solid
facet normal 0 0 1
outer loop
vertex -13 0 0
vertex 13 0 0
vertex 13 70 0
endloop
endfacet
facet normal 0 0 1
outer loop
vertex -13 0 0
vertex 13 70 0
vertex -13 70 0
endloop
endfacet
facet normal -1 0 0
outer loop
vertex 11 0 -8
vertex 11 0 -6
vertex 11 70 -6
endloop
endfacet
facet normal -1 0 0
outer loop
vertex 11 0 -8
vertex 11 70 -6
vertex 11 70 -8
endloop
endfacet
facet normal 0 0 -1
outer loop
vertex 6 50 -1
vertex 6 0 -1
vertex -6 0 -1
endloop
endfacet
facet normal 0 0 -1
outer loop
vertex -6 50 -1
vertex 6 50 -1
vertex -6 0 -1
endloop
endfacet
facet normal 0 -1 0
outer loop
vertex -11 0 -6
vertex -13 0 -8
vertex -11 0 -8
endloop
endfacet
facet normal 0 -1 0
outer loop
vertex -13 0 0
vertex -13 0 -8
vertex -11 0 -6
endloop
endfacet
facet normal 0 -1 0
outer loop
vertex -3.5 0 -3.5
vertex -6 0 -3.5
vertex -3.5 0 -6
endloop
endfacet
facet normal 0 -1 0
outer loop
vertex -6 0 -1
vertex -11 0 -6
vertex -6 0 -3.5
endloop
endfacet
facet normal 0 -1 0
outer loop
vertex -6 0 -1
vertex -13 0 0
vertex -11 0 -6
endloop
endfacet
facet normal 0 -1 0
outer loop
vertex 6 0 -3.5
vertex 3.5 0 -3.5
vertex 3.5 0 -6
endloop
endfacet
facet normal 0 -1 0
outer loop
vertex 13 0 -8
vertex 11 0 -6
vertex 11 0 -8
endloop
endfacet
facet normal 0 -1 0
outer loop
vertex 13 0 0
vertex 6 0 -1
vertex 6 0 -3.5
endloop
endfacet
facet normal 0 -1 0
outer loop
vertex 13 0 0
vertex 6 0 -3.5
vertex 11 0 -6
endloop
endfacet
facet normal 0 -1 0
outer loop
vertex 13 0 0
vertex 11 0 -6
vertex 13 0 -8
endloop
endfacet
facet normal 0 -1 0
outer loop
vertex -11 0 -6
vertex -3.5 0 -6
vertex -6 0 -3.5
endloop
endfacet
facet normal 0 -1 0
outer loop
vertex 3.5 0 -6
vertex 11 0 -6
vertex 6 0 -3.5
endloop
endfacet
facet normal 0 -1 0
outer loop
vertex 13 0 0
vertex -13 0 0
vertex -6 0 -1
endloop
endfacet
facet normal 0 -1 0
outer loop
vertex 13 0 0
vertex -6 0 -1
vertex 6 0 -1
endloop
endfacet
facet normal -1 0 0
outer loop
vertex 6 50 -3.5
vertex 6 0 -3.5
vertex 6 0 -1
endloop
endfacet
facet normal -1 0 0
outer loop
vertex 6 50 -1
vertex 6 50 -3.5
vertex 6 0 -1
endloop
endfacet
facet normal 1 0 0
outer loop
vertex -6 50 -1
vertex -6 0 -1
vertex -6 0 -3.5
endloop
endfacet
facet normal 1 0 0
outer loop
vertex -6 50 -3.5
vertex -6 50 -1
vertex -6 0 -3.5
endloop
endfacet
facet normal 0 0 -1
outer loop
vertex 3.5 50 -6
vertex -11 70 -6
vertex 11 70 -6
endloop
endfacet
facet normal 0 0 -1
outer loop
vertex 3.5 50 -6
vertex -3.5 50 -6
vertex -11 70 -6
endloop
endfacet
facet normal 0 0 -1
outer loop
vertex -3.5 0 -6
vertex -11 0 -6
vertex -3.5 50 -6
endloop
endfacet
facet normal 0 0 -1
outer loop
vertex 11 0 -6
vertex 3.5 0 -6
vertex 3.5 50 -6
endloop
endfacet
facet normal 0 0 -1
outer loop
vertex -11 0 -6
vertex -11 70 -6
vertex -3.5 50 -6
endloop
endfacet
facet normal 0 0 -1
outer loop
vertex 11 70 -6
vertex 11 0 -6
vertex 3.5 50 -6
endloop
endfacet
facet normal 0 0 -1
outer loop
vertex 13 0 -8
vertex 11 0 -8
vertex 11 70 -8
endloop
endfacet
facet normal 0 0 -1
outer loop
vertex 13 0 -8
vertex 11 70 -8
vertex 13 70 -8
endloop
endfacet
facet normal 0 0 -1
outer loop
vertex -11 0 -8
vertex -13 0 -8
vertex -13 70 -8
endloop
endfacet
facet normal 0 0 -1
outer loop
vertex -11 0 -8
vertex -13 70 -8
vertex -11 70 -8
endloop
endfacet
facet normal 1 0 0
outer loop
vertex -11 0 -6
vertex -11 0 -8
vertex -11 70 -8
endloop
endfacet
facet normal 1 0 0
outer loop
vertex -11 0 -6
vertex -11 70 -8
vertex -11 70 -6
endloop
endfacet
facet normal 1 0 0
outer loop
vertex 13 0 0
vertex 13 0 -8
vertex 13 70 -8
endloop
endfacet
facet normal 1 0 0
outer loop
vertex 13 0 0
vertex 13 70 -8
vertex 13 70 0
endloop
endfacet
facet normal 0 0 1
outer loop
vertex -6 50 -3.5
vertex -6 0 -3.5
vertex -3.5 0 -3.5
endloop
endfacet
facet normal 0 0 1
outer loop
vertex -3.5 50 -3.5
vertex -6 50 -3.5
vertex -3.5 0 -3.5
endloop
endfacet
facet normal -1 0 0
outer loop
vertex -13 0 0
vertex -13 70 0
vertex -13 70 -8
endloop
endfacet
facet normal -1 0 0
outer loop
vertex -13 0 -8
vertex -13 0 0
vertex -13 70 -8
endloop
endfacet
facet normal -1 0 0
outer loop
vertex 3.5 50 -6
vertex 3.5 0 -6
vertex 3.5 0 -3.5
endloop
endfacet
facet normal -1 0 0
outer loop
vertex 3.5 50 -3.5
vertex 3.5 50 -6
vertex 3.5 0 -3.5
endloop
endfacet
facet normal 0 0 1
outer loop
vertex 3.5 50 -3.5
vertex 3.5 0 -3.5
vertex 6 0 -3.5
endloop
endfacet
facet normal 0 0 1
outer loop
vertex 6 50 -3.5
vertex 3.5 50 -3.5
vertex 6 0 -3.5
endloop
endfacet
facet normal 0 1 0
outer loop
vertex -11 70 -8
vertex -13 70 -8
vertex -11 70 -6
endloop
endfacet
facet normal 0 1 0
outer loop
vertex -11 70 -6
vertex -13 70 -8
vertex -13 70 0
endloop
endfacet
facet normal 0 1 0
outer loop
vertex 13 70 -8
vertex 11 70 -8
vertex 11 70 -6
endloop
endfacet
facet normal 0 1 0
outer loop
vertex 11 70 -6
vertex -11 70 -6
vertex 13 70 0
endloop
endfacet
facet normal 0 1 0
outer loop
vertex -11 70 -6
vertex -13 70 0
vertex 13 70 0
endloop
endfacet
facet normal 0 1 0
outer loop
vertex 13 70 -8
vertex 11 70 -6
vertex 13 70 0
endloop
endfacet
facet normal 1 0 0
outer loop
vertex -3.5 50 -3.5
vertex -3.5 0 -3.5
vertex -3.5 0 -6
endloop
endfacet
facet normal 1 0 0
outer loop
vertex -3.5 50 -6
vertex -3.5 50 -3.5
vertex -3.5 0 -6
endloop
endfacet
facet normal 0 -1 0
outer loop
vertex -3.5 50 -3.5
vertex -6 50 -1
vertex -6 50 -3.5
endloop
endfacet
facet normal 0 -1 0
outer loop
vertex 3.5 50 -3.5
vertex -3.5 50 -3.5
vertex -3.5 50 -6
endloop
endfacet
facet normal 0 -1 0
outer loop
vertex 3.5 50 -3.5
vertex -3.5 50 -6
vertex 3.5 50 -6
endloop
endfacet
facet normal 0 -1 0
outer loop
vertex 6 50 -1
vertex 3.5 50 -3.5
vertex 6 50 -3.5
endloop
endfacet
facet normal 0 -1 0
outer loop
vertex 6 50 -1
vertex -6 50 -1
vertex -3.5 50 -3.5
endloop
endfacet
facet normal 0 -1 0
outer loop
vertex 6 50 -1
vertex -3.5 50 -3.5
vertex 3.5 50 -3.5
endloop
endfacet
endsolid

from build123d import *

# Parameters (mm, degrees)
F1_DEPTH = 70
F3_DEPTH = 50


with BuildPart() as f1:
    # F0 (on Front) → F1 (new body)
    with BuildSketch(Plane.XZ):
        Polygon((-11, -6), (11, -6), (11, -8), (13, -8), (13, 0), (-13, 0), (-13, -8), (-11, -8), align=None)
    extrude(amount=-F1_DEPTH)

    # F2 (on face) → F3 (cut)
    with BuildSketch(Plane.XZ):
        Polygon((-3.5, -3.5), (-3.5, -6), (3.5, -6), (3.5, -3.5), (6, -3.5), (6, -1), (-6, -1), (-6, -3.5), align=None)
    extrude(amount=-F3_DEPTH, mode=Mode.SUBTRACT)


solid = f1.part
